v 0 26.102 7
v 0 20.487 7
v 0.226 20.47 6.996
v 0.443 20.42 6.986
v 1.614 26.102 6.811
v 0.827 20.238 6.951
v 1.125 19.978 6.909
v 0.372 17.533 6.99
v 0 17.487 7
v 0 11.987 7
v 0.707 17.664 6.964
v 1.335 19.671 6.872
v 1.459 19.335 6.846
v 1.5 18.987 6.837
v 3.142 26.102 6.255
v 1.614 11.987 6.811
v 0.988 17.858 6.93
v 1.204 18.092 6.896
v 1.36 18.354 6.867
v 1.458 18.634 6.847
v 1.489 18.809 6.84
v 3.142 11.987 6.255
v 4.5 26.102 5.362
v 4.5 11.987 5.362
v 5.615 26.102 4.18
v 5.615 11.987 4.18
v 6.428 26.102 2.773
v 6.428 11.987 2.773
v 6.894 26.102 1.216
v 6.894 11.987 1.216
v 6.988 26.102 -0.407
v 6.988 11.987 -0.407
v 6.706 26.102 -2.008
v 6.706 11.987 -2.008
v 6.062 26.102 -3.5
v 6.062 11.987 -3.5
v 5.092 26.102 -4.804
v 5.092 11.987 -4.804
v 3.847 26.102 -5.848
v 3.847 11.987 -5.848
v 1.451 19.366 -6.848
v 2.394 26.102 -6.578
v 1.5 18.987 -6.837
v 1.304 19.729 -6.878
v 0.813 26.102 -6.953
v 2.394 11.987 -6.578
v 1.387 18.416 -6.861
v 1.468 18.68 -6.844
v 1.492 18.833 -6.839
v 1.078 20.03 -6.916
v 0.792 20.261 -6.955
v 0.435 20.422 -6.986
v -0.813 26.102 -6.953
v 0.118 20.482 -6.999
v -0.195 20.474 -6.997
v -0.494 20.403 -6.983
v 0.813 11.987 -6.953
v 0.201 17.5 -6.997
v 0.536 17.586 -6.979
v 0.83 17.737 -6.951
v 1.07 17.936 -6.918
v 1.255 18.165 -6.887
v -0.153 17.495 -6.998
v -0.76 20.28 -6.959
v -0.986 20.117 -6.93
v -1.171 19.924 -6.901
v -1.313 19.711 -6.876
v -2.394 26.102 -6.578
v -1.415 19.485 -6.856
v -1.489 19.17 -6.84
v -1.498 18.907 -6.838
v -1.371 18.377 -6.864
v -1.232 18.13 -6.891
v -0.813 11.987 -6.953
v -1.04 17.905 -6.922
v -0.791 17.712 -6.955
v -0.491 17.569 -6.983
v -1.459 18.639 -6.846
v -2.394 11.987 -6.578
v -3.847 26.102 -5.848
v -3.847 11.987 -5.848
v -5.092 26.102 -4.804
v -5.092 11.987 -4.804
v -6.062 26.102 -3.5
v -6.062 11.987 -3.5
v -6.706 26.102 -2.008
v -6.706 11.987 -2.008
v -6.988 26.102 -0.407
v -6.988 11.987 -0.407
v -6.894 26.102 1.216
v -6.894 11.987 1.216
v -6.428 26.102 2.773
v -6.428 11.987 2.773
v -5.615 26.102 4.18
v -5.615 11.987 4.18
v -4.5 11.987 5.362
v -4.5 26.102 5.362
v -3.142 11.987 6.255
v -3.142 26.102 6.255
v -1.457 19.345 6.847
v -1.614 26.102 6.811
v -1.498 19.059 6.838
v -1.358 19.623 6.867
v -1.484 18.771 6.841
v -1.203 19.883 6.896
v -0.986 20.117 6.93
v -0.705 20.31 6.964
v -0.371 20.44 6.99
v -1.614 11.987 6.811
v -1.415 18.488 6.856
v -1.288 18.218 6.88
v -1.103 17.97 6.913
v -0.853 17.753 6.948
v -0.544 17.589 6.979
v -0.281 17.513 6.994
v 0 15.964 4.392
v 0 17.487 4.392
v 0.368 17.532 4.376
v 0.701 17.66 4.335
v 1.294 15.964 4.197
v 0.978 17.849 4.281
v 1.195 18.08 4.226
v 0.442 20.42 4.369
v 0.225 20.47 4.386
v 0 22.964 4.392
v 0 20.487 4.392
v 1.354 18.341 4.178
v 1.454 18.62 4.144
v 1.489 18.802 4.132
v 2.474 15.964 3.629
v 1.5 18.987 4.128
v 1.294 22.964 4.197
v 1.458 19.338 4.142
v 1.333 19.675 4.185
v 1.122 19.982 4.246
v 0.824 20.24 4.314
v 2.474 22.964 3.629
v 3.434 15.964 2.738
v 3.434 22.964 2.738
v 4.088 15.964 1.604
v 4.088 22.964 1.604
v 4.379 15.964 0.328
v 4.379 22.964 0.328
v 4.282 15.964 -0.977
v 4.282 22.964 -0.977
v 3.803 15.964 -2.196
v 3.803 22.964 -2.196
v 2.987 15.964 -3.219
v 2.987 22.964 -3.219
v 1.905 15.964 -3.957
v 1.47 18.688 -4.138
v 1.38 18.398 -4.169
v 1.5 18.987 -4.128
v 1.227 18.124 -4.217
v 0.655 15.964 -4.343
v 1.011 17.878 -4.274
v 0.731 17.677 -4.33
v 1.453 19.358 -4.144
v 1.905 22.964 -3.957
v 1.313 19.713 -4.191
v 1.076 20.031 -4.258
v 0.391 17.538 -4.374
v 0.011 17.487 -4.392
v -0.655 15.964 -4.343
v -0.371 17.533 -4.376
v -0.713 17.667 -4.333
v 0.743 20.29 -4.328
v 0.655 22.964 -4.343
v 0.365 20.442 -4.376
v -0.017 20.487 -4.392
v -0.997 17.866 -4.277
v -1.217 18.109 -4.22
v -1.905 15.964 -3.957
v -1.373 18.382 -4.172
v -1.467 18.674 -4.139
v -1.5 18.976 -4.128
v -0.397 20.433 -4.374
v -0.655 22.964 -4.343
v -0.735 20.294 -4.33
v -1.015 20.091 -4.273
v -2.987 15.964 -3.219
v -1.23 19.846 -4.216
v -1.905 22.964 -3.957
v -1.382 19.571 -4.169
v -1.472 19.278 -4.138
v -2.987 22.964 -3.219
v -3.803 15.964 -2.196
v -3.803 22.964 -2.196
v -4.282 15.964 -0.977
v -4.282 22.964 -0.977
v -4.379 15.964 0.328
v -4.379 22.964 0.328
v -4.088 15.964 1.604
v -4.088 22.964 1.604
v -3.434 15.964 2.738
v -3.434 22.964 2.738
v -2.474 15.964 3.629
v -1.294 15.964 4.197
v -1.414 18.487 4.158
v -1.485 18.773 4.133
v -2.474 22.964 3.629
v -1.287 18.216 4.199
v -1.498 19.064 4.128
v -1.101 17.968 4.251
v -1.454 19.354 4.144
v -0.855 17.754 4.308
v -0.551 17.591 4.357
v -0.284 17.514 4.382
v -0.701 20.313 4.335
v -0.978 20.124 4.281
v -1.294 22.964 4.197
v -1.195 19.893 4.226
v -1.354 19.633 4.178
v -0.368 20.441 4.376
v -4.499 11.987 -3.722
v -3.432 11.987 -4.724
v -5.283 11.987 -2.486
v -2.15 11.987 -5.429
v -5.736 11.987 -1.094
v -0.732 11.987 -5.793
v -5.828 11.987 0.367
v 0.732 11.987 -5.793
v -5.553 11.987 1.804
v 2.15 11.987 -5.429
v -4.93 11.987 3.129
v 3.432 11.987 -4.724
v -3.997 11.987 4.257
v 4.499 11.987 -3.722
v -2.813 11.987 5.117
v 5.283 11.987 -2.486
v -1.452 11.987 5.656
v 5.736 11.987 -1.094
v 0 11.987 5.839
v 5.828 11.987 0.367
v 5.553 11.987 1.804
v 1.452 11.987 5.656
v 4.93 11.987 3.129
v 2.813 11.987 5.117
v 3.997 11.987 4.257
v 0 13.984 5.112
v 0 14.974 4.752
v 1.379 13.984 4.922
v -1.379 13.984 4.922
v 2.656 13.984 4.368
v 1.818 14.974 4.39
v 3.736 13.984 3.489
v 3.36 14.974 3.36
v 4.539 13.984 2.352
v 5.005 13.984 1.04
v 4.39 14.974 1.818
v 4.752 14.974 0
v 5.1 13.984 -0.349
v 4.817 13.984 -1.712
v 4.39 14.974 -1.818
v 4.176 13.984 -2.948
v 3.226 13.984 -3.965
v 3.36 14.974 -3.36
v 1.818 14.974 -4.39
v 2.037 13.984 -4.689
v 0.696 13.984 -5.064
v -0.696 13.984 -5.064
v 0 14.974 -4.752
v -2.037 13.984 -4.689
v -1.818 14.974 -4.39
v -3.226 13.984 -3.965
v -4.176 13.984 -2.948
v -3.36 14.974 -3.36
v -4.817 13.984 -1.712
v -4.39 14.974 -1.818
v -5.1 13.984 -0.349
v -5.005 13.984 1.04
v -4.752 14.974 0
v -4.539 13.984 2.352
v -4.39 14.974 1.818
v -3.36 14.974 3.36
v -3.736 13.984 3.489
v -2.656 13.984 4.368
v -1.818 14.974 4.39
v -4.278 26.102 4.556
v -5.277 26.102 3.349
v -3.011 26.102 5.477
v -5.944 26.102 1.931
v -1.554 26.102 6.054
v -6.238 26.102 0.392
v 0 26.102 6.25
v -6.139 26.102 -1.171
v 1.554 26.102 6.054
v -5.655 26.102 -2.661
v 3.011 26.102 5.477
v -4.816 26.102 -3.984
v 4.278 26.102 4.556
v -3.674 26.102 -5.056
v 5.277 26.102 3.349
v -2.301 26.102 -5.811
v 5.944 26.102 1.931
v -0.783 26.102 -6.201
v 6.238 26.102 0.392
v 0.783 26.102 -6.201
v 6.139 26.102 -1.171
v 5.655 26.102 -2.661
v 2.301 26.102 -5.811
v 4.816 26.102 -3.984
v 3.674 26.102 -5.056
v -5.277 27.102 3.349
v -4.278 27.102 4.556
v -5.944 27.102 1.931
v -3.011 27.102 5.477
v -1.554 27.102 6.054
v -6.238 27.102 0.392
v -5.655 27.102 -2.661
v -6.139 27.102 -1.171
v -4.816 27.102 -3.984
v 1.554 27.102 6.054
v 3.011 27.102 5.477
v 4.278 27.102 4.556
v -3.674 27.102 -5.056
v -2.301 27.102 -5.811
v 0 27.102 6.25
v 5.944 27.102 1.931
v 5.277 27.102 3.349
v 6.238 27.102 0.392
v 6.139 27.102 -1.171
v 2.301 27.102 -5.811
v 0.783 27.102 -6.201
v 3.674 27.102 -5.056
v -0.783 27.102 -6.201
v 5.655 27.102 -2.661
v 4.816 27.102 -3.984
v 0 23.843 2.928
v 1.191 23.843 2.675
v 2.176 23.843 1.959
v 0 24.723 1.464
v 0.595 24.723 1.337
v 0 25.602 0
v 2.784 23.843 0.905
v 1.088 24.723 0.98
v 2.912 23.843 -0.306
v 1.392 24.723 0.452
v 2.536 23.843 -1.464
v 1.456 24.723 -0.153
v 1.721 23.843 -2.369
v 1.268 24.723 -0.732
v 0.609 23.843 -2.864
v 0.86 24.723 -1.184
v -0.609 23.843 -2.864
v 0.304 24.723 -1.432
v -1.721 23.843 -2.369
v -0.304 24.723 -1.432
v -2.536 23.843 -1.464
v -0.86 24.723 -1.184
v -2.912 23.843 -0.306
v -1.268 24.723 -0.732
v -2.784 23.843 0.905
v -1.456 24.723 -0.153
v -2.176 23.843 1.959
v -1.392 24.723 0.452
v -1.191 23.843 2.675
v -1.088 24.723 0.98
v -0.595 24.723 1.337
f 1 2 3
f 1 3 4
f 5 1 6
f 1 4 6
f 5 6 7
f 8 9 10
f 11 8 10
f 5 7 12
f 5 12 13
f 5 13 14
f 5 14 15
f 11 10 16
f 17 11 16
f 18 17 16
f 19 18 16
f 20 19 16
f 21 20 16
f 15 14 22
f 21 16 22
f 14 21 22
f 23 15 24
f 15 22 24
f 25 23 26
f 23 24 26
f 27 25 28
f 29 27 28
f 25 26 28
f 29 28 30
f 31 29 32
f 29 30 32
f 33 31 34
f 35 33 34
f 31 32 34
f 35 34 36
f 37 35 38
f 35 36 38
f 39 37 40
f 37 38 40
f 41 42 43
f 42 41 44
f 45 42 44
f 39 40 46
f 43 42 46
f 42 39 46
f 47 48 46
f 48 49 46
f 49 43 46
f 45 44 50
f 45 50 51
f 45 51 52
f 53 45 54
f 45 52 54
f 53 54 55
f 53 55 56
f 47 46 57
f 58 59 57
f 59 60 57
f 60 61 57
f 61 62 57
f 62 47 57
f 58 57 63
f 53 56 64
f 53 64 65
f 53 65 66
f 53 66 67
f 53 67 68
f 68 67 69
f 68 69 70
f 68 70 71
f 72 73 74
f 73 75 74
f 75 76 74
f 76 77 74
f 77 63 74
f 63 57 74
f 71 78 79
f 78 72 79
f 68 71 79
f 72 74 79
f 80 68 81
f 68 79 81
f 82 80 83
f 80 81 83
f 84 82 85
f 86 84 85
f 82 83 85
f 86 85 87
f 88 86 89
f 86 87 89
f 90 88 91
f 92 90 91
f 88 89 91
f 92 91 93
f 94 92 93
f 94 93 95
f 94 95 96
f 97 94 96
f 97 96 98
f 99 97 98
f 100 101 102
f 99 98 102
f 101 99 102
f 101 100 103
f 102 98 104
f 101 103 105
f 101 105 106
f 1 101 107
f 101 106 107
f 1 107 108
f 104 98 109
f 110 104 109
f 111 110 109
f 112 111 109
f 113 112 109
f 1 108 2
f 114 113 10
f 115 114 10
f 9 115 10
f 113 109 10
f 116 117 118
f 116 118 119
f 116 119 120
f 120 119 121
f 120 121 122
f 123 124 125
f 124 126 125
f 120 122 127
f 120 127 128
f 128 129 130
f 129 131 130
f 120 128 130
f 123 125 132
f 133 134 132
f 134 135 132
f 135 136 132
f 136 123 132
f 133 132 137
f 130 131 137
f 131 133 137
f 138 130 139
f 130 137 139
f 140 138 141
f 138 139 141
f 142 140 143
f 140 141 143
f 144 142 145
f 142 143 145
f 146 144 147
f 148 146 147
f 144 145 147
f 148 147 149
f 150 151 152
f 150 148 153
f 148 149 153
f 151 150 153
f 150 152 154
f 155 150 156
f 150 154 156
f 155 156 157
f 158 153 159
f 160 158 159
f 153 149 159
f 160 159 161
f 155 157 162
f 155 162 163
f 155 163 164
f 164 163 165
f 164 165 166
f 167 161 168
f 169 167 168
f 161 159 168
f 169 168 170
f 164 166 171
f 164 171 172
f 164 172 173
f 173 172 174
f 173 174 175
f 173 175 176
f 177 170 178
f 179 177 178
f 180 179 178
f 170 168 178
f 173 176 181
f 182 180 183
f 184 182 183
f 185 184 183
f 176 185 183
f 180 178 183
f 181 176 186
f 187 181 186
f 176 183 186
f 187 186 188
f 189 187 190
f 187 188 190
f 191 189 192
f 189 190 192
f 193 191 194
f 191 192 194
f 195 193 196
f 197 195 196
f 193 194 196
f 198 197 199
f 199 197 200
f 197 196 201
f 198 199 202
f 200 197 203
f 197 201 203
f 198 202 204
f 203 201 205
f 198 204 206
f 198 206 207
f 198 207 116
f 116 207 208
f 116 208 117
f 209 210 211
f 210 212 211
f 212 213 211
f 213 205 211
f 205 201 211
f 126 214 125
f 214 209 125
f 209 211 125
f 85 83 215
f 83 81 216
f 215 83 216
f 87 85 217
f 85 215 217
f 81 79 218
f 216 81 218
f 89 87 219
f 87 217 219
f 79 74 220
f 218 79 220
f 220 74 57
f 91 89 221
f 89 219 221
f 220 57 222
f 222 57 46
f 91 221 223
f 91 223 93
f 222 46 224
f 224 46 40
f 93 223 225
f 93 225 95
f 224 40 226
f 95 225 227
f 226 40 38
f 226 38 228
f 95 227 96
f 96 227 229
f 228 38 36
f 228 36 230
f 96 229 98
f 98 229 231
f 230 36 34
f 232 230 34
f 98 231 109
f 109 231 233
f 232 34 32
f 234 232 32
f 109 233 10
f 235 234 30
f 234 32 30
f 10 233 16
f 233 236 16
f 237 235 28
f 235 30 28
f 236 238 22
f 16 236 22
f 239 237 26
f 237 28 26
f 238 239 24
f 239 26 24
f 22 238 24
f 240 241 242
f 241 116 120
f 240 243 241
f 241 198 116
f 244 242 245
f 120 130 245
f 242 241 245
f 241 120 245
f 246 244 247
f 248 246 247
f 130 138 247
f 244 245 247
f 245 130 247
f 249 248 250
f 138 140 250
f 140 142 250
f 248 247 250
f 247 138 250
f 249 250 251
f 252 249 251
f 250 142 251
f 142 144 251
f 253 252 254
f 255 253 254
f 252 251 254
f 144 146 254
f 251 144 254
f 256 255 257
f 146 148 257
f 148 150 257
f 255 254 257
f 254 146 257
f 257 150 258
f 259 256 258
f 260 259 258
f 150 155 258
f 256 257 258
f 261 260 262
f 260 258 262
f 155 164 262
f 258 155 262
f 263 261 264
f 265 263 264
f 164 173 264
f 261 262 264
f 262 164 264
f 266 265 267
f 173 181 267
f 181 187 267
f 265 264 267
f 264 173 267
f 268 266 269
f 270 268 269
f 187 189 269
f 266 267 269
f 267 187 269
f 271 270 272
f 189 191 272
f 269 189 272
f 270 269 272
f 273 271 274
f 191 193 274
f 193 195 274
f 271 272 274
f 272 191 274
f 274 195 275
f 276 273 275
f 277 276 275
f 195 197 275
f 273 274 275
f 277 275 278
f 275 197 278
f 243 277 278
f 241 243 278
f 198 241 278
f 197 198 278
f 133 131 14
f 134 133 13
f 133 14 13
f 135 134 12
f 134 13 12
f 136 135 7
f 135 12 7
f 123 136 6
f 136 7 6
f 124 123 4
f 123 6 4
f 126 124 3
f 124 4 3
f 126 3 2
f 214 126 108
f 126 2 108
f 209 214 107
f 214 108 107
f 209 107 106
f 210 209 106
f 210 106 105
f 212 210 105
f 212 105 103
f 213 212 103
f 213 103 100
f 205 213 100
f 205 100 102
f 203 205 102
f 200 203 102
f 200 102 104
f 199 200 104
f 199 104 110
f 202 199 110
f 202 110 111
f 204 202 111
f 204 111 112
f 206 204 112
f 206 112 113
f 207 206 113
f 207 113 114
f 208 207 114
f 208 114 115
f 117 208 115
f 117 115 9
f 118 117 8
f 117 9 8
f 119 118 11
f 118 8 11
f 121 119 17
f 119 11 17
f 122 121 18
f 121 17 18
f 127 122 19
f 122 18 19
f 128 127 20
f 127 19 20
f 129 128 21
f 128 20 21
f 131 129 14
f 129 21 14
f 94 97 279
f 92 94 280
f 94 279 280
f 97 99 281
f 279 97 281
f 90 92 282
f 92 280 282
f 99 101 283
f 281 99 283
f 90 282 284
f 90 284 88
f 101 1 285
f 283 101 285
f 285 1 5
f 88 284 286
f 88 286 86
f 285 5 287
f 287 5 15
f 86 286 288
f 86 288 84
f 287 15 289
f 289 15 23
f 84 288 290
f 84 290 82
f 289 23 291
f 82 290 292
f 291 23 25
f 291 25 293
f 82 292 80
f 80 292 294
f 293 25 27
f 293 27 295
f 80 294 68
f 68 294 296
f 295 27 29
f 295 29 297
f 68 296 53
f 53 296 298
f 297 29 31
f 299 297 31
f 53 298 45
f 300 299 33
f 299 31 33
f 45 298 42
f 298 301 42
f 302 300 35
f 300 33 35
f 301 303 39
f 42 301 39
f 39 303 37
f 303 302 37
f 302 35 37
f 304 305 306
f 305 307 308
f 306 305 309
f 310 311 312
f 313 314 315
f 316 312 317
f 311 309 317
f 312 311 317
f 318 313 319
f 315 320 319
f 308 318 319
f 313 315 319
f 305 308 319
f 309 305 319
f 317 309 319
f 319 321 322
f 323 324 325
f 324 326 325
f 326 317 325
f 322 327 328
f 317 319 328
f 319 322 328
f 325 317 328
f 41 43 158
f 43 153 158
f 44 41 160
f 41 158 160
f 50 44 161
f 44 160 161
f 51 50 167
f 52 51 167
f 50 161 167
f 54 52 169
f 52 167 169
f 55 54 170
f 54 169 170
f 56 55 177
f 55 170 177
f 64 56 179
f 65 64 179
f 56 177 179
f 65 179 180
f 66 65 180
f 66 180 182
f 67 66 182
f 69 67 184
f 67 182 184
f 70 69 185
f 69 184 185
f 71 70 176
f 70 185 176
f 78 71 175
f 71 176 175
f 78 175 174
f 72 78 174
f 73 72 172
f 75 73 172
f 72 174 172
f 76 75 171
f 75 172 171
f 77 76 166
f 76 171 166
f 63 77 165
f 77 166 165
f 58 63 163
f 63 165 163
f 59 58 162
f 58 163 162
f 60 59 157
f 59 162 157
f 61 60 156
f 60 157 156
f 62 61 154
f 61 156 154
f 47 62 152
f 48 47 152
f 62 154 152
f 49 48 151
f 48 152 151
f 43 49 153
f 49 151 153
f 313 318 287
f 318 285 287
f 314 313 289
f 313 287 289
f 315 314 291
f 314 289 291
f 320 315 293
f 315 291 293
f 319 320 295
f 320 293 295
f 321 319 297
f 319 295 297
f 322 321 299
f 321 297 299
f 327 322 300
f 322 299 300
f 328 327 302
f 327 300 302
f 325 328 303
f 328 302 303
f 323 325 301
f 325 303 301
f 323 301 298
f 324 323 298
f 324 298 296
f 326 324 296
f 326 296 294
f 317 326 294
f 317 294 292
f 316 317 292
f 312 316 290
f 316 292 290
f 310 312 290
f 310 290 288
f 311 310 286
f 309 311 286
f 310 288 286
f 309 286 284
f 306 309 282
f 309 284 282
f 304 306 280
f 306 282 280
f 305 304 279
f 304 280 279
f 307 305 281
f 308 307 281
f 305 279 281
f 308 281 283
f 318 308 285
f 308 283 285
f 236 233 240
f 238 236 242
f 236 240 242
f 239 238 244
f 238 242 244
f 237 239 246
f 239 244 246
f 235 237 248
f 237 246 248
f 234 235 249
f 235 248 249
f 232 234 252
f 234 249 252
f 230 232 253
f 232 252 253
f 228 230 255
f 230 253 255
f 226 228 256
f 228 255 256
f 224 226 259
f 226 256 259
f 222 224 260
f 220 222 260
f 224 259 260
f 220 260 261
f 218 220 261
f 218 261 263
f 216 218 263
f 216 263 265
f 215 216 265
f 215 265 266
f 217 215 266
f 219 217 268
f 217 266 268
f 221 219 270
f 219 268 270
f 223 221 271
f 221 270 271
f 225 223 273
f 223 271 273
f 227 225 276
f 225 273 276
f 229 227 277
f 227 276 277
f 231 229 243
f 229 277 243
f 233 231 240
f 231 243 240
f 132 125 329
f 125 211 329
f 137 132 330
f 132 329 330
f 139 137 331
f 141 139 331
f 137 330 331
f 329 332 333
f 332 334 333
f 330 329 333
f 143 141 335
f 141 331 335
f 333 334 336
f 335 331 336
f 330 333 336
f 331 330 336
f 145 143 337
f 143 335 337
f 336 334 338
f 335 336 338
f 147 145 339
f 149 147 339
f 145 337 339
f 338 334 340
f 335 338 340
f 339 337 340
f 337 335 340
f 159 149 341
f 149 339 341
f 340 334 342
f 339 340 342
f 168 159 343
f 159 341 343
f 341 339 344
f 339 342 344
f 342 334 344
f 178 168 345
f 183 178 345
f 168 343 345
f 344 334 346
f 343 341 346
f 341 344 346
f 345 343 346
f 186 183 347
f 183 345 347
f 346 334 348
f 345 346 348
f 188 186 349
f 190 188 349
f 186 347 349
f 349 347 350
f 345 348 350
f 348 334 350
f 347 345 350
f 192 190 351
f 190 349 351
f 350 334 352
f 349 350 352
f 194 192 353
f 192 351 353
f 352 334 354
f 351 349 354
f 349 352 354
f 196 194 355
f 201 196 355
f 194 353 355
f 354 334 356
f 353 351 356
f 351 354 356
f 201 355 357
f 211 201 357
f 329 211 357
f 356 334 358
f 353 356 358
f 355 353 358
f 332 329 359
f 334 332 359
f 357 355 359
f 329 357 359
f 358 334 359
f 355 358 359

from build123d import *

# Parameters (mm, degrees)
SKETCH2_R          = 1.5
CUT_EXTRUDE2_DEPTH = 7


with BuildPart() as part:
    # Sketch1 → Revolve1 (revolve)
    with BuildSketch(Plane.XY, mode=Mode.PRIVATE) as revolve1_sk:
        Polygon((0, 25.602357553), (0, 27.102357553), (-6.25, 27.102357553), (-6.25, 26.102357553), (-7, 26.102357553), (-7, 11.986662945), (-5.839130901, 11.986662945), (-5.11205907, 13.984276384), (-4.391648147, 15.963589129), (-4.391648147, 18.963589129), (-4.391648147, 22.963589129), align=None)
    revolve(revolve1_sk.sketch.rotate(Axis((0, -49.511916915, 0), (0, 1, 0)), 90), axis=Axis((0, -49.511916915, 0), (0, 1, 0)))

    # Sketch2 → Cut-Extrude2 (cut, symmetric)
    with BuildSketch(Plane.XY):
        with Locations((0, 18.986662945)):
            Circle(SKETCH2_R)
    extrude(amount=CUT_EXTRUDE2_DEPTH, both=True, mode=Mode.SUBTRACT)


solid = part.part
